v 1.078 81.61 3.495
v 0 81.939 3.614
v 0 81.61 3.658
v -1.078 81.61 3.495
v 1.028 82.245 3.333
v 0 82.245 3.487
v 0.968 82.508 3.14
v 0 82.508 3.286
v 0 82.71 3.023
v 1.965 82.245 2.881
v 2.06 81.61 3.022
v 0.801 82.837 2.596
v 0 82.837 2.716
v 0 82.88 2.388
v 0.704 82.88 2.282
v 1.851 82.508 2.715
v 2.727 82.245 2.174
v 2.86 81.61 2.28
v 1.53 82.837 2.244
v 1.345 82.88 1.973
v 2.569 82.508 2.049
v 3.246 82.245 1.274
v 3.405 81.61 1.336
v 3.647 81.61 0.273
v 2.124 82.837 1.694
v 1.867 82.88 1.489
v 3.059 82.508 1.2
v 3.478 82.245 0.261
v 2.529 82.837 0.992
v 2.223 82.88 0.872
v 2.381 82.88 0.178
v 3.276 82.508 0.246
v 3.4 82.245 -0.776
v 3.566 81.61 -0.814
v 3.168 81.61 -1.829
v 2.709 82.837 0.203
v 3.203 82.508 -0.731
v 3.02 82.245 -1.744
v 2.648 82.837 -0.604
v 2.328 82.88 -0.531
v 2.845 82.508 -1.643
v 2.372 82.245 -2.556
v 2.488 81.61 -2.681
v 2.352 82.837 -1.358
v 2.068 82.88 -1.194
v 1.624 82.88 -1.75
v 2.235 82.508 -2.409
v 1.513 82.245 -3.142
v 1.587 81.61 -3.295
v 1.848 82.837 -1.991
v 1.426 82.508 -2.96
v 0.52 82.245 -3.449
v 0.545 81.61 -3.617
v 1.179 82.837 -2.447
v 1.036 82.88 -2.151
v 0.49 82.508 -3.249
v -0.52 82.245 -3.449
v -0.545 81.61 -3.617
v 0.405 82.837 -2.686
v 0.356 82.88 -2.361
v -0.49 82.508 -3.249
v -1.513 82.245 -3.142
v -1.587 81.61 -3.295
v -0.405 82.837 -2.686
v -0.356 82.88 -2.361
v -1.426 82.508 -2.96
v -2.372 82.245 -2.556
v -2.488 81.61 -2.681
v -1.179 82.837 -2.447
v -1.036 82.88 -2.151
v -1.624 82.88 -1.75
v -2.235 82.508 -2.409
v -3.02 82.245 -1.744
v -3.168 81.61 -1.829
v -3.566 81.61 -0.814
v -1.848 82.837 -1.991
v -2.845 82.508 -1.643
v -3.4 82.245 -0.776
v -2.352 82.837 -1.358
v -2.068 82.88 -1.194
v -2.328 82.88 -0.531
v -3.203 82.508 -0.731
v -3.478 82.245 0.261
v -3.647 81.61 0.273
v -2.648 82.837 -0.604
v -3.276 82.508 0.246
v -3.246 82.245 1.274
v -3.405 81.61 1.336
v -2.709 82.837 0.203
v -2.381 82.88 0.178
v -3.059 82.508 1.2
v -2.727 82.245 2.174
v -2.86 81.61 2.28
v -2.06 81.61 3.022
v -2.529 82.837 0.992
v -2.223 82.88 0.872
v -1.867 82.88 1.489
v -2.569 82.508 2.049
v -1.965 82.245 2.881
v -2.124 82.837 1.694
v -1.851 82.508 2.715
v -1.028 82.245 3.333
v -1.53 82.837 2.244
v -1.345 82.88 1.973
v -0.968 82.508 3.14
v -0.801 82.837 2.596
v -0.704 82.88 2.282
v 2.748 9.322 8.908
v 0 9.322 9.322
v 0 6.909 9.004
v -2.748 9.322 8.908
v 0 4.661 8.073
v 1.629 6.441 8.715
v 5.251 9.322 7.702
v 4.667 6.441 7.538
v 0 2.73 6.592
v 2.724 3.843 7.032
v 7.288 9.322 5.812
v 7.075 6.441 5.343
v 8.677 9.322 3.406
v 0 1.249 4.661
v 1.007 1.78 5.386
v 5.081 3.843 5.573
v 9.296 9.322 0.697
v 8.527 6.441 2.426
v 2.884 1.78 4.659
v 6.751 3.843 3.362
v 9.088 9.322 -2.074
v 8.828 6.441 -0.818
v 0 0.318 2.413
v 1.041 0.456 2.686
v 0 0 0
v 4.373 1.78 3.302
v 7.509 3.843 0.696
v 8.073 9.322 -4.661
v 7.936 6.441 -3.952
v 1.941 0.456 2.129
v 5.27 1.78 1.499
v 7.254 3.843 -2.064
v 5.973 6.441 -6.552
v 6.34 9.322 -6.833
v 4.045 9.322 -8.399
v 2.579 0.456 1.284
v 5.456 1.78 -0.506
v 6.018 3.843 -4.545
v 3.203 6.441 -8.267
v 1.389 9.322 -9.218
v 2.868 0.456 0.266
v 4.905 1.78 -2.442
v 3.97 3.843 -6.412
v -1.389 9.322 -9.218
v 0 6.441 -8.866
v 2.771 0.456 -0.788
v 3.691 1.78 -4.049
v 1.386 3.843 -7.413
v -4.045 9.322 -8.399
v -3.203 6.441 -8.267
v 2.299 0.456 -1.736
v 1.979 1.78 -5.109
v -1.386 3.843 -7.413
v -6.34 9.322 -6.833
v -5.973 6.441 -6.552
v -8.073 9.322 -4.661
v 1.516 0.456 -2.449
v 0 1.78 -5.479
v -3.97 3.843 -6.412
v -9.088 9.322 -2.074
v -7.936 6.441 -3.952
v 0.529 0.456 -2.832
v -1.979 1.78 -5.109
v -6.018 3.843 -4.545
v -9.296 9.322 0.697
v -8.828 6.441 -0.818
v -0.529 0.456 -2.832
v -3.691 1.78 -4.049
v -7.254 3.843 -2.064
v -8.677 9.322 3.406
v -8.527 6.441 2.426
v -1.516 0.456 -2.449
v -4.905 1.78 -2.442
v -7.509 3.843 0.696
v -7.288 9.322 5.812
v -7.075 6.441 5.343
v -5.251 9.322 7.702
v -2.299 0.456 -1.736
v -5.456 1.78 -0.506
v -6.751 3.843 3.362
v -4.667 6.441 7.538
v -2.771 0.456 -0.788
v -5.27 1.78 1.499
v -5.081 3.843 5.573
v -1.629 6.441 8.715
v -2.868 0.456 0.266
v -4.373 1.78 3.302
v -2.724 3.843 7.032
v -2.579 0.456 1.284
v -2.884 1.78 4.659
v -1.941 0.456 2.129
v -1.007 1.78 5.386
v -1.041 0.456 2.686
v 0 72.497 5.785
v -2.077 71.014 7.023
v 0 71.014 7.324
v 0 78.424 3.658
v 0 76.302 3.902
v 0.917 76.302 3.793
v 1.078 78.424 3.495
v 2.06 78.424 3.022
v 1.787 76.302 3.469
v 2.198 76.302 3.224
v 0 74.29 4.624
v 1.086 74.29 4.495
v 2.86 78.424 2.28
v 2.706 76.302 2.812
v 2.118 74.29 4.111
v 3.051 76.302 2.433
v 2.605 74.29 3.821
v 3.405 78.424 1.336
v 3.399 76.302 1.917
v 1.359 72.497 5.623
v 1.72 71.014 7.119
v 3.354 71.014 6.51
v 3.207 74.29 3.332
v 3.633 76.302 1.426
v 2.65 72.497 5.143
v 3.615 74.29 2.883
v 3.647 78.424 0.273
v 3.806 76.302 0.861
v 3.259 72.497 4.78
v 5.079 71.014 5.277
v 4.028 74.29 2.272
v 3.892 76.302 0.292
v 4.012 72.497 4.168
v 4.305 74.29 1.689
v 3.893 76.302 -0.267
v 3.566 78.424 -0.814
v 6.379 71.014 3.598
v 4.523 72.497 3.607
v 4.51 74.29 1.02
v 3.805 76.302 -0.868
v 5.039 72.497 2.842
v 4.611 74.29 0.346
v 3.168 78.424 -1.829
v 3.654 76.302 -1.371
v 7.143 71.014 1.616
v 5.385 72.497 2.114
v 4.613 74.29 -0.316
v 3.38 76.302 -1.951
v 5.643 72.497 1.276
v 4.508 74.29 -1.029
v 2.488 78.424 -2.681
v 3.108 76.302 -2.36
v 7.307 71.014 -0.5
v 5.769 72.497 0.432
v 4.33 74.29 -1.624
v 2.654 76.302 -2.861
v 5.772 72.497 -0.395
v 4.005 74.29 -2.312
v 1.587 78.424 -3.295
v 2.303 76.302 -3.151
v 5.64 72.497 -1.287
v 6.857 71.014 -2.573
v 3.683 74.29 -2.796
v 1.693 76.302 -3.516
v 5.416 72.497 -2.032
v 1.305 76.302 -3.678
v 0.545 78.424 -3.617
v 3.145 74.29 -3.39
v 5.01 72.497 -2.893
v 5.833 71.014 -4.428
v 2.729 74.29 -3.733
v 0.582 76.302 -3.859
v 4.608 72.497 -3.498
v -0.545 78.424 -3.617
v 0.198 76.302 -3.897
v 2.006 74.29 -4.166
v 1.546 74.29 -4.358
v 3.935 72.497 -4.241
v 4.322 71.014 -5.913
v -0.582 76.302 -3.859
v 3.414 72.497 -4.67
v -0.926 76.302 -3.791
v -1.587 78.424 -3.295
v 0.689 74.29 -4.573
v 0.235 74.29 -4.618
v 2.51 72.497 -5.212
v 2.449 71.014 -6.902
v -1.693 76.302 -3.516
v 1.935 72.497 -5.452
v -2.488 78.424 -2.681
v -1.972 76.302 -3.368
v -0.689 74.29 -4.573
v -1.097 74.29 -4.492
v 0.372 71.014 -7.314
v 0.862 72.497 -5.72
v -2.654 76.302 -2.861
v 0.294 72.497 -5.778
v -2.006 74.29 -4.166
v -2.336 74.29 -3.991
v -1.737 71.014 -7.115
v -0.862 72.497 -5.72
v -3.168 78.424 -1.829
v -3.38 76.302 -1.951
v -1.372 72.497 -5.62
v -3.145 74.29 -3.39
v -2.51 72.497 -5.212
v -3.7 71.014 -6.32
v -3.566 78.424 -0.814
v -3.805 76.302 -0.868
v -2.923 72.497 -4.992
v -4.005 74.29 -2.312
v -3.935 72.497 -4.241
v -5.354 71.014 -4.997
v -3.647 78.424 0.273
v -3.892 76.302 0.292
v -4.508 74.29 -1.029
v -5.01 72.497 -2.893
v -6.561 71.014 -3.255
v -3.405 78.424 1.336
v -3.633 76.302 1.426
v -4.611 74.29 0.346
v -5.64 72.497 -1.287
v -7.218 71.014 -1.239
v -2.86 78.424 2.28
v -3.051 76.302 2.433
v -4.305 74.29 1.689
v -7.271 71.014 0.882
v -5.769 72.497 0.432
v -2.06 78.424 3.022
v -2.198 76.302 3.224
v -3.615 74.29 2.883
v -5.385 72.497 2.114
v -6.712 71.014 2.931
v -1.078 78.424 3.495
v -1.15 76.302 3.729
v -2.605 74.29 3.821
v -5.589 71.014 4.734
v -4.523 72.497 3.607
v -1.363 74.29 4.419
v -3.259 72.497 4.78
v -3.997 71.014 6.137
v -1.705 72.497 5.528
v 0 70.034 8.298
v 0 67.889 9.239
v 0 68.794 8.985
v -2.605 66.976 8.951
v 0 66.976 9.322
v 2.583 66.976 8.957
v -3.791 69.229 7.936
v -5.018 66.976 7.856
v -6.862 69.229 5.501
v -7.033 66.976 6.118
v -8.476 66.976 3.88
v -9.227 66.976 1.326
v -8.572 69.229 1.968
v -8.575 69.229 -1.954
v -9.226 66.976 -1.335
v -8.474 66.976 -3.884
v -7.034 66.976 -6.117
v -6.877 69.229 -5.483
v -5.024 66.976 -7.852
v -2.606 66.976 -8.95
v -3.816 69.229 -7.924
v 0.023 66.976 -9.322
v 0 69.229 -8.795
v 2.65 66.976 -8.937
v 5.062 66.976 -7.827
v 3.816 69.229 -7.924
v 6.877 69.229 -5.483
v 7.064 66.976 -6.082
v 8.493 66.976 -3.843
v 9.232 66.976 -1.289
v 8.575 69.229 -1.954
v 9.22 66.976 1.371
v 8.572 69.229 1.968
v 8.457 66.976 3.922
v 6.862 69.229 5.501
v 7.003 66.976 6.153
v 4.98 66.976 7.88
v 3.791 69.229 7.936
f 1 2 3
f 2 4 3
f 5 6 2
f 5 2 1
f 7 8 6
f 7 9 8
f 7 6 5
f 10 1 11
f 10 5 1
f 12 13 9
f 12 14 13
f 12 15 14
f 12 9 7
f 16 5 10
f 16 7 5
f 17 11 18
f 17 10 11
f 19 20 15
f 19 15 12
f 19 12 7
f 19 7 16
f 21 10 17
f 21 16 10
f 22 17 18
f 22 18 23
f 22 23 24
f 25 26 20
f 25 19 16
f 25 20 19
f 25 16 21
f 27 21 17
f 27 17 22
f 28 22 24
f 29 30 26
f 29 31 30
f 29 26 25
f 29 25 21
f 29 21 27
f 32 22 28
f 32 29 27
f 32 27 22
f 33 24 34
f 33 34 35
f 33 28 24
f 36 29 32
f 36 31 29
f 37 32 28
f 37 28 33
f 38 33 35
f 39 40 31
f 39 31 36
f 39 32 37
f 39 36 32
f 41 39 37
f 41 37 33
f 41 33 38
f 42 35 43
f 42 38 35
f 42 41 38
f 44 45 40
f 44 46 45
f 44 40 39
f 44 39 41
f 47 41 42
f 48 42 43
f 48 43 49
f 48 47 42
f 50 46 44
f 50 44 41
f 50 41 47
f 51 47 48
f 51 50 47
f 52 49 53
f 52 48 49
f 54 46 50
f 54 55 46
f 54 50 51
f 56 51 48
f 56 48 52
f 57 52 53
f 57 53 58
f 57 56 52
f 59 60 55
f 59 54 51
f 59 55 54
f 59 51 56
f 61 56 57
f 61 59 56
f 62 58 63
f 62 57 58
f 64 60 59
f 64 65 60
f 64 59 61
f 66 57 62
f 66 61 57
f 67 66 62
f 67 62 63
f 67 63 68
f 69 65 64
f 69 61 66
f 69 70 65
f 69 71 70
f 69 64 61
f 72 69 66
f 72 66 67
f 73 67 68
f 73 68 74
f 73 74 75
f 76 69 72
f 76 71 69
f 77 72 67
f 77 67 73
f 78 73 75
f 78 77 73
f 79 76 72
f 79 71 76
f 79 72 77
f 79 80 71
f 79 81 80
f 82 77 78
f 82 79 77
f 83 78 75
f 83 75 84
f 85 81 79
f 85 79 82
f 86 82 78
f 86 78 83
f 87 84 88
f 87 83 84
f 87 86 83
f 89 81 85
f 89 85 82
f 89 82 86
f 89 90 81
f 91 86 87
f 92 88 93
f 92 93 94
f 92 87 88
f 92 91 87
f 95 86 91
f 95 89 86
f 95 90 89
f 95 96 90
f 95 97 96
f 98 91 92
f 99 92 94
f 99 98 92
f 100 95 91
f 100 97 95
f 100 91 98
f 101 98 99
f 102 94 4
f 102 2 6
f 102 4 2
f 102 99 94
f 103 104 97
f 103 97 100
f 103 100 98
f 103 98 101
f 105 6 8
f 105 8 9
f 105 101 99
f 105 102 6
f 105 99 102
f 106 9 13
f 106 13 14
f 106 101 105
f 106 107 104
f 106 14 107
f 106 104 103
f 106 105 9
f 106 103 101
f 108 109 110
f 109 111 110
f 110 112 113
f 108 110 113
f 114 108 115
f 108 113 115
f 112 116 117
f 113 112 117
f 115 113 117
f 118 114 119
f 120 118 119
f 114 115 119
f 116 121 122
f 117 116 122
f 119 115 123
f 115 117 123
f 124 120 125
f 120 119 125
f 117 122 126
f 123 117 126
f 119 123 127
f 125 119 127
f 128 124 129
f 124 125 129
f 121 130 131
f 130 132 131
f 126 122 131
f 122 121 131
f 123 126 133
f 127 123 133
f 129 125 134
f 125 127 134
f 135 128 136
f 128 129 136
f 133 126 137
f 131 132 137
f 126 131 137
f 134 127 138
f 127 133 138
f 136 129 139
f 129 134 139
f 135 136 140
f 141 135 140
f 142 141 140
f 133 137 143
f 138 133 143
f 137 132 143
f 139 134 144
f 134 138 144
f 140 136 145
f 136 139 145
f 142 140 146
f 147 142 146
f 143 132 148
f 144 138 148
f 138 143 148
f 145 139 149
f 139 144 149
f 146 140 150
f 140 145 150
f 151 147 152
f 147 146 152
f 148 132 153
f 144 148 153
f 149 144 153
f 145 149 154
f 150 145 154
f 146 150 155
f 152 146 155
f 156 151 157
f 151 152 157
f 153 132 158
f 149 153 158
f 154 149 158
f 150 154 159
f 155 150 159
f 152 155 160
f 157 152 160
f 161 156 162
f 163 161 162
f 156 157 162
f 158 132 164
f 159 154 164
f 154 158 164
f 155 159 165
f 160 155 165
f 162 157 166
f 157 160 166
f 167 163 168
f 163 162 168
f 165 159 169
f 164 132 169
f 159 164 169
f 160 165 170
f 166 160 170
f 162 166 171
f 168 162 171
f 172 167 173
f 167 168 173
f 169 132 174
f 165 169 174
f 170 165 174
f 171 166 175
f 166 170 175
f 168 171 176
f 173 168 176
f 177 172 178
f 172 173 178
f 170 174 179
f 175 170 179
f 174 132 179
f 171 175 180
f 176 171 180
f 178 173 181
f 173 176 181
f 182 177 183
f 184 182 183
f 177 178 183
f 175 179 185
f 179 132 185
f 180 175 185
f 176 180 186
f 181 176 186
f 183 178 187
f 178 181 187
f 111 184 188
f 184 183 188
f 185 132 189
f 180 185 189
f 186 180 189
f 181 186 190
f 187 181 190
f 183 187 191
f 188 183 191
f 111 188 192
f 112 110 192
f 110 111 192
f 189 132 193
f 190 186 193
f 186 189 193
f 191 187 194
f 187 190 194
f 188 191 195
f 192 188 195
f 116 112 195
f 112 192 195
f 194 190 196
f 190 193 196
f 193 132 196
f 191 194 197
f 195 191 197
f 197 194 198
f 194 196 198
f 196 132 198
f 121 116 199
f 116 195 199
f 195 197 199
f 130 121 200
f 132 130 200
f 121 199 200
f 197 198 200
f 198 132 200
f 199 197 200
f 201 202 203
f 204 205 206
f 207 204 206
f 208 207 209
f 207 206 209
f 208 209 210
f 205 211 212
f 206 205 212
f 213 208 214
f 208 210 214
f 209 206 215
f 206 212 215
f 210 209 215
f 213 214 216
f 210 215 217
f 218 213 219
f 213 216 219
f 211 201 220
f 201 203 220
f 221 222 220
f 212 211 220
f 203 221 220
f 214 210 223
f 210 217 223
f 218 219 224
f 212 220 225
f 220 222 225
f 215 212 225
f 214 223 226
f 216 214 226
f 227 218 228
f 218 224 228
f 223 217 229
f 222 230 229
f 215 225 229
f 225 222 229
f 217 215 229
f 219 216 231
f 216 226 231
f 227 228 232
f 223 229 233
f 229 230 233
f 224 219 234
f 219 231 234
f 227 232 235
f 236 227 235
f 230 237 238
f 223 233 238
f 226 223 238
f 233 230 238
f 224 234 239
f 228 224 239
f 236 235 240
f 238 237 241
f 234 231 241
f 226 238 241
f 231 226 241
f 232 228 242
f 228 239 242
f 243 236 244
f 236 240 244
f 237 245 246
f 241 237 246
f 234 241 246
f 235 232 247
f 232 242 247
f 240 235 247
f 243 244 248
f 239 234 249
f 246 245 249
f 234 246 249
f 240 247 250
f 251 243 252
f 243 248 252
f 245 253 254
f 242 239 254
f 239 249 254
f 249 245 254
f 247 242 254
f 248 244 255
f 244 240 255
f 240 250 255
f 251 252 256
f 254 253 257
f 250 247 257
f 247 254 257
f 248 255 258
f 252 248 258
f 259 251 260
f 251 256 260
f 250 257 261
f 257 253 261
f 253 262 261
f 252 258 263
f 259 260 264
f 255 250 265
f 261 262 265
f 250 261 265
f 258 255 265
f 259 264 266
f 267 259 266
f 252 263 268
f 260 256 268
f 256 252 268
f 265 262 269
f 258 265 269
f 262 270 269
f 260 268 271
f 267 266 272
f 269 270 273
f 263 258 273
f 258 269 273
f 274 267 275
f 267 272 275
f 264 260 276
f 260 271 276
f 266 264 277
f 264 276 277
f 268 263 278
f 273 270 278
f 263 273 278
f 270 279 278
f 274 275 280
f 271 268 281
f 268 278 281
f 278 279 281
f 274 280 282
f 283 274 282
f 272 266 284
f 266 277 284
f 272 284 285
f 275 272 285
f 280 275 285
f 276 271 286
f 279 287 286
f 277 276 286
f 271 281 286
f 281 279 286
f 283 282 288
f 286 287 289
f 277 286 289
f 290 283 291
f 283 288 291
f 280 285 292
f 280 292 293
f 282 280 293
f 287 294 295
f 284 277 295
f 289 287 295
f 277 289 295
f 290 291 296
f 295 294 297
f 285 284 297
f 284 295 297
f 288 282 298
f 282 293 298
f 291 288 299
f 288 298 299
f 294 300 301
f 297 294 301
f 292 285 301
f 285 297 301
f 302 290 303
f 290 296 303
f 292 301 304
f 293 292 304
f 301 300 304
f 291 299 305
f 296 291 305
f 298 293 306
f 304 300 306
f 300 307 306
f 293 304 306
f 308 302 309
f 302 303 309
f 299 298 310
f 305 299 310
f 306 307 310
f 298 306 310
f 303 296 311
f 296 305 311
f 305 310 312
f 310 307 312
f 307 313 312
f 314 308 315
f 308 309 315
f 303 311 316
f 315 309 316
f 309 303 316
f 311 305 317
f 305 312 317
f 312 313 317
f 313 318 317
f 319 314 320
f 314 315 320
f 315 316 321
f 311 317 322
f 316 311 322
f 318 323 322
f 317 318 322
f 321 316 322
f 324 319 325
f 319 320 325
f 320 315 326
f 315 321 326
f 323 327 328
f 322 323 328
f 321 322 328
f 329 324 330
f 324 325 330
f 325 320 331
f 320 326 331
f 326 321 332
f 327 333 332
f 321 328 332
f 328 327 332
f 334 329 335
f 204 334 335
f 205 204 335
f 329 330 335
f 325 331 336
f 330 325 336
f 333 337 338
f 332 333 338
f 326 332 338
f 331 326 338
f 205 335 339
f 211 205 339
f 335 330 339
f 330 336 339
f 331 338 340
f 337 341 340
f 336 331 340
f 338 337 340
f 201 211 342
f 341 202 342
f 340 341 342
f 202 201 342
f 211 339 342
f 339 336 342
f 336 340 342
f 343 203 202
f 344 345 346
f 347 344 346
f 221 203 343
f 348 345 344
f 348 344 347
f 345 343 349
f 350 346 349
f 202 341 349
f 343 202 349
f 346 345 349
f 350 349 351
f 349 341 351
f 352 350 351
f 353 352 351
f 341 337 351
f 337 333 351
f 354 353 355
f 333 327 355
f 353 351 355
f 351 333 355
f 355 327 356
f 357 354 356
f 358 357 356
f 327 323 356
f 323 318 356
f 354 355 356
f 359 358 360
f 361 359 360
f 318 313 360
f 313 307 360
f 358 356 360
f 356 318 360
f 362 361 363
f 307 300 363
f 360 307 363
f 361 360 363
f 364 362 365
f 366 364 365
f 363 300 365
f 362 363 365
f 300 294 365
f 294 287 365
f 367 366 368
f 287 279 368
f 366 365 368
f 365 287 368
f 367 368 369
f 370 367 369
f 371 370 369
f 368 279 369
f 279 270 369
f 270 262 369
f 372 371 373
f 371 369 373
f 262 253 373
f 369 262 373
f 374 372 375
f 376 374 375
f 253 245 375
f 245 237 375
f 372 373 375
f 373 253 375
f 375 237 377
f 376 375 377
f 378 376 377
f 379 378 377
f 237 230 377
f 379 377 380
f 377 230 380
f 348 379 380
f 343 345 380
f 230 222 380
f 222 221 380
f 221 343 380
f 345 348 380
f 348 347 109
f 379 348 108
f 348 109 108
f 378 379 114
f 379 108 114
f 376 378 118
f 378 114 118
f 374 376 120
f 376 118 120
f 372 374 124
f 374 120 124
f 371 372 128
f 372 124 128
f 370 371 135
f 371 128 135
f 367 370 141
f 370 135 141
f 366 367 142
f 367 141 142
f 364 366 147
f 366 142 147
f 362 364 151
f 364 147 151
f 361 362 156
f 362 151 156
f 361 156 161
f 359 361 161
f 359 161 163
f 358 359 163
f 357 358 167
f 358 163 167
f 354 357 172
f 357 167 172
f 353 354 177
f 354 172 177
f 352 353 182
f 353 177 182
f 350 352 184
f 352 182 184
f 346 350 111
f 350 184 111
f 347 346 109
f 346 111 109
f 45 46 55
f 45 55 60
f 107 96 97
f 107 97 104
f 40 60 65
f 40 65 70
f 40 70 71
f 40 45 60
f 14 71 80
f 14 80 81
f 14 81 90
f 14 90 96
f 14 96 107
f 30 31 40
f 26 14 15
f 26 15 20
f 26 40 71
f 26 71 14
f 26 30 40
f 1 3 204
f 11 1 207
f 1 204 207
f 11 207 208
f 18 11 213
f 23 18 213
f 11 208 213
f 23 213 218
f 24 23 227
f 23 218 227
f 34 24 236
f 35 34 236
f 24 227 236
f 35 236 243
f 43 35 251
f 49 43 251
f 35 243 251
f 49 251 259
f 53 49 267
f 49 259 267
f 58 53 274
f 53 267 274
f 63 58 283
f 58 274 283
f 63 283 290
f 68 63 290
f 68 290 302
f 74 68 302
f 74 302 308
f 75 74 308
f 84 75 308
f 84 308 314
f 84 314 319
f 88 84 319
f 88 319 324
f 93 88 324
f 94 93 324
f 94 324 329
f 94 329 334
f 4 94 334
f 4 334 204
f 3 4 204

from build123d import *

# Parameters (mm, degrees)
SKETCH2_R           = 9.3218
BOSS_EXTRUDE1_DEPTH = 82.8802
FILLET1_R           = 9.3218
CUT_EXTRUDE1_START  = -13.0302
SKETCH3_R           = 9.3218
SKETCH3_R_2         = 3.6576
CUT_EXTRUDE1_DEPTH  = 13.0302
FILLET2_R           = 9.3218
FILLET3_R           = 5.08
FILLET5_R           = 1.27


with BuildPart() as part:
    # Sketch2 → Boss-Extrude1 (new body)
    with BuildSketch(Plane(origin=(0, 0, 0), x_dir=(1, 0, 0), z_dir=(0, 1, 0))):
        with Locations(Location((0, 0, 0), (0, 0, 270))):
            Circle(SKETCH2_R)
    extrude(amount=BOSS_EXTRUDE1_DEPTH)

    # Fillet1
    fillet1_edges = [part.edges().sort_by_distance(p)[0] for p in [
        (0, 0, -9.3218),
    ]]
    fillet(fillet1_edges, radius=FILLET1_R)

    # Sketch3 → Cut-Extrude1 (cut)
    with BuildSketch(Plane(origin=(0, 82.8802, 0), x_dir=(1, 0, 0), z_dir=(0, 1, 0)).offset(CUT_EXTRUDE1_START)):
        with Locations(Location((0, 0, 0), (0, 0, 90))):
            Circle(SKETCH3_R)
        with Locations(Location((0, 0, 0), (0, 0, 270))):
            Circle(SKETCH3_R_2, mode=Mode.SUBTRACT)
    extrude(amount=CUT_EXTRUDE1_DEPTH, mode=Mode.SUBTRACT)

    # Fillet2
    # the kernel refuses this fillet: 9.3218 mm, written as the material it adds along each edge
    with BuildSketch(Plane(origin=(0, 69.85, 0), x_dir=(0, 0, 1), z_dir=(-1, 0, 0))) as fillet2_piece_1:
        with BuildLine():
            CenterArc((12.9794, 8.574259005), FILLET2_R, 180, 66.897916031)
            Line((3.6576, 8.574259005), (3.471164, 8.574259005))
            Line((3.471164, 8.574259005), (3.471164, 0))
            Line((3.471164, 0), (3.6576, -0.186436))
            ThreePointArc((3.6576, -0.186436), (6.4897, -0.186436), (9.248648, -0.17148518))
            Line((9.248648, -0.17148518), (9.3218, 0))
        make_face()
    revolve(axis=Axis((0, 69.85, 0), (0, 1, 0)))

    # Fillet3
    fillet3_edges = [part.edges().sort_by_distance(p)[0] for p in [
        (0, 69.85, -9.3218),
    ]]
    fillet(fillet3_edges, radius=FILLET3_R)

    # Fillet5
    fillet5_edges = [part.edges().sort_by_distance(p)[0] for p in [
        (0, 82.8802, -3.6576),
    ]]
    fillet(fillet5_edges, radius=FILLET5_R)


solid = part.part
